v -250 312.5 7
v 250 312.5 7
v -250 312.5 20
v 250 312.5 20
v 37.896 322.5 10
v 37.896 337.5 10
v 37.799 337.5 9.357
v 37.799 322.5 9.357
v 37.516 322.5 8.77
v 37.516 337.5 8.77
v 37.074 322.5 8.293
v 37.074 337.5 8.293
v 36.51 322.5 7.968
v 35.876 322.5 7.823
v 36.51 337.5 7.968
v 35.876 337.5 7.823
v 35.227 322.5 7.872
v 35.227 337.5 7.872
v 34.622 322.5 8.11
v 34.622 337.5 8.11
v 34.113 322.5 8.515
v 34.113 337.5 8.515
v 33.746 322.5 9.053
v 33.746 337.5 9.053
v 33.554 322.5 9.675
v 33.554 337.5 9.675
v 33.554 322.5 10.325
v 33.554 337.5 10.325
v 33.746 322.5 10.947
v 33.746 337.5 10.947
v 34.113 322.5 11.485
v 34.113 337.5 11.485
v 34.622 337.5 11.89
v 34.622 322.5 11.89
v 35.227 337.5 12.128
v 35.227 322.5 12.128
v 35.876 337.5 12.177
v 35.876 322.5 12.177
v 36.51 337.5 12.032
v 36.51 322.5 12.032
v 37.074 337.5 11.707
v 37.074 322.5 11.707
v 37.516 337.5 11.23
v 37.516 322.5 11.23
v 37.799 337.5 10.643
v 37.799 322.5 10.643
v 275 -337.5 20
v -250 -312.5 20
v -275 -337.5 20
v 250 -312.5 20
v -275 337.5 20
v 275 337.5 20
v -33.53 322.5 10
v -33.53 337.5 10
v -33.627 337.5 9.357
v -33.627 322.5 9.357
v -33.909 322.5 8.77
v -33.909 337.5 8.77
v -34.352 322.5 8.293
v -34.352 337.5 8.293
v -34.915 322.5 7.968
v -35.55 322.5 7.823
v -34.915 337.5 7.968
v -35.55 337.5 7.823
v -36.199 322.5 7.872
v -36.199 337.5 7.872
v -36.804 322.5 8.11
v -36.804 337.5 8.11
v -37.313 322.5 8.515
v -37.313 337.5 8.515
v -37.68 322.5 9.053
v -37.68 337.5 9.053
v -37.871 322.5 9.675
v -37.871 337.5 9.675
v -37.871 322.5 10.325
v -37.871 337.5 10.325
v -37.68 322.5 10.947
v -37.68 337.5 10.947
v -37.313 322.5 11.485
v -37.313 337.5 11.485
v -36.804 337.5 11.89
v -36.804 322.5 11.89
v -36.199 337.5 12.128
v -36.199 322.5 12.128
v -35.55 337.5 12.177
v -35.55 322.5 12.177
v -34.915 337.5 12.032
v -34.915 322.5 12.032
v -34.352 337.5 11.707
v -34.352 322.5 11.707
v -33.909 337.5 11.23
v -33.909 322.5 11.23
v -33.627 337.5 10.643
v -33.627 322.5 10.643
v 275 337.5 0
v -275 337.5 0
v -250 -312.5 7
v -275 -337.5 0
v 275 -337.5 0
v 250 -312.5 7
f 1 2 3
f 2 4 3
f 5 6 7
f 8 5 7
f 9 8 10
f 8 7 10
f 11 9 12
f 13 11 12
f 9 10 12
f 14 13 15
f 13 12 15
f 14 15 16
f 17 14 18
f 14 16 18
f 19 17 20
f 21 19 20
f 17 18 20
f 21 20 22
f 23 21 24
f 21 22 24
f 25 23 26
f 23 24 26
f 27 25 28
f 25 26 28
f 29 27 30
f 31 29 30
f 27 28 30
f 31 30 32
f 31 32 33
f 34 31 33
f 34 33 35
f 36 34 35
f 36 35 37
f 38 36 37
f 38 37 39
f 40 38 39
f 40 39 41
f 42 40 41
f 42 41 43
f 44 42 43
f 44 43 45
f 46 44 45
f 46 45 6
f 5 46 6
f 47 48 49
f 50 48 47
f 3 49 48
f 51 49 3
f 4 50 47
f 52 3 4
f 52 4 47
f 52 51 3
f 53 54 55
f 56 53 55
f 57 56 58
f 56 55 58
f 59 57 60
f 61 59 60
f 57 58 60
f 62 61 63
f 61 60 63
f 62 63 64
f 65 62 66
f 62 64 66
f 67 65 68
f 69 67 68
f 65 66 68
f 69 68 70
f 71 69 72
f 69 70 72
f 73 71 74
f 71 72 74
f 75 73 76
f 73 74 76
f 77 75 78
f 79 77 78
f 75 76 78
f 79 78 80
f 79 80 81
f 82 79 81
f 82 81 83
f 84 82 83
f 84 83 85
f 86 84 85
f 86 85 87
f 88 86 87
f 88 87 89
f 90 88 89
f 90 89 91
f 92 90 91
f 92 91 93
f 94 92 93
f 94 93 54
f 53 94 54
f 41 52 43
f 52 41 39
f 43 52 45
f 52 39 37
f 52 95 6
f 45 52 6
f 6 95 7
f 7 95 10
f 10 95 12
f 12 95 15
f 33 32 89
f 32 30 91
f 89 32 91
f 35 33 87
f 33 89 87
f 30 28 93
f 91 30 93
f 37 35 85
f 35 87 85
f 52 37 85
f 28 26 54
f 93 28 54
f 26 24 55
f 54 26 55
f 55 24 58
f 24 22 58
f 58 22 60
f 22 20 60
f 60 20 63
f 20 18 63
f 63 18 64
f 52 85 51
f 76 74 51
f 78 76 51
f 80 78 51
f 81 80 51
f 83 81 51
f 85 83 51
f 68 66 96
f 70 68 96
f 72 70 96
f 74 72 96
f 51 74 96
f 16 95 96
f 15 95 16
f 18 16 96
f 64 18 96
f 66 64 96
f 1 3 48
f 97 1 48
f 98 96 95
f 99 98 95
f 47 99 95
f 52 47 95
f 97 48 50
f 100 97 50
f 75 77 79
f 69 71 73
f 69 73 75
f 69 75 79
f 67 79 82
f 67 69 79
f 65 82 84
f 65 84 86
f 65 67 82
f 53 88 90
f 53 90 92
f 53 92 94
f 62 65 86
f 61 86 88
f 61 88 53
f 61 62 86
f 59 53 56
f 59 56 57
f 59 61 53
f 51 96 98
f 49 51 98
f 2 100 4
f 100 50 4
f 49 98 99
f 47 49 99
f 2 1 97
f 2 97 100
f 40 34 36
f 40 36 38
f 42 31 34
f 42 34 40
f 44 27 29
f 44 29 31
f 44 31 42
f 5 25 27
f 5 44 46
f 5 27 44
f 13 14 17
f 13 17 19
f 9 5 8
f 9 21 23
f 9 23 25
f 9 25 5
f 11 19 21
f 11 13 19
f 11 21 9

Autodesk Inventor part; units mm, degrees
ref_plane "YZ Plane" through (0, 0, 0) normal (1, 0, 0) x (0, 1, 0)
ref_plane "XZ Plane" through (0, 0, 0) normal (0, 1, 0) x (-1, 0, 0)
ref_plane "XY Plane" through (0, 0, 0) normal (0, 0, 1) x (1, 0, 0)
sketch "Sketch1" plane through (0, 0, 0) normal (0, 0, 1) x (1, 0, 0)
  line L0 (-275, -337.5) -> (275, -337.5)
  line L1 (275, -337.5) -> (275, 337.5)
  line L2 (275, 337.5) -> (-275, 337.5)
  line L3 (-275, 337.5) -> (-275, -337.5)
  line L4 (-275, -337.5) -> (275, 337.5) construction
  line L5 (275, -337.5) -> (-275, 337.5) construction
  point P0 (0, 0)
  dimension "d0" = 550
  dimension "d1" = 675
extrude "Extrusion1" add sketch "Sketch1" along normal blind 20
sketch "Sketch2" plane through (0, 0, 20) normal (0, 0, 1) x (1, 0, 0)
  line L0 (-250, -312.5) -> (250, -312.5)
  line L1 (250, -312.5) -> (250, 312.5)
  line L2 (250, 312.5) -> (-250, 312.5)
  line L3 (-250, 312.5) -> (-250, -312.5)
  line L4 (-250, -312.5) -> (250, 312.5) construction
  line L5 (250, -312.5) -> (-250, 312.5) construction
  point P0 (0, 0)
  dimension "d4" = 500
  dimension "d5" = 625
extrude "Extrusion2" cut sketch "Sketch2" against normal blind 13
sketch "Sketch3" plane through (-275, 337.5, 0) normal (0, 1, 0) x (1, 0, 0)
  line L0 (550, 0) -> (550, -20) projected
  line L1 (0, 0) -> (0, -20) projected
  line L2 (0, 0) -> (0, -20) projected
  line L3 (0, -10) -> (230.6764, -10)
  line L4 (525, -7) -> (25, -7) projected
  line L5 (0, -10) -> (230.6764, -10) construction
  line L6 (319.3236, 0) -> (230.6764, 0)
  line L7 (230.6764, 0) -> (230.6764, -20)
  line L8 (230.6764, -20) -> (319.3236, -20)
  line L9 (319.3236, -20) -> (319.3236, 0)
  line L10 (319.3236, 0) -> (230.6764, -20) construction
  line L11 (230.6764, 0) -> (319.3236, -20) construction
  circle A0 centre (239.2871, -10) radius 2.1828
  line L12 (275, 0) -> (275, -20)
  circle A1 centre (310.7129, -10) radius 2.1828
  point P0 (275, -10)
  dimension "d8" = 550
  dimension "d9" = 230.6764
  dimension "d10" = 0
  dimension "d11" = 4.3656
  dimension "d12" = 8.6106
extrude "Extrusion3" cut sketch "Sketch3" against normal blind 15 contours A0 | A1
properties part number "WoodFrame"
